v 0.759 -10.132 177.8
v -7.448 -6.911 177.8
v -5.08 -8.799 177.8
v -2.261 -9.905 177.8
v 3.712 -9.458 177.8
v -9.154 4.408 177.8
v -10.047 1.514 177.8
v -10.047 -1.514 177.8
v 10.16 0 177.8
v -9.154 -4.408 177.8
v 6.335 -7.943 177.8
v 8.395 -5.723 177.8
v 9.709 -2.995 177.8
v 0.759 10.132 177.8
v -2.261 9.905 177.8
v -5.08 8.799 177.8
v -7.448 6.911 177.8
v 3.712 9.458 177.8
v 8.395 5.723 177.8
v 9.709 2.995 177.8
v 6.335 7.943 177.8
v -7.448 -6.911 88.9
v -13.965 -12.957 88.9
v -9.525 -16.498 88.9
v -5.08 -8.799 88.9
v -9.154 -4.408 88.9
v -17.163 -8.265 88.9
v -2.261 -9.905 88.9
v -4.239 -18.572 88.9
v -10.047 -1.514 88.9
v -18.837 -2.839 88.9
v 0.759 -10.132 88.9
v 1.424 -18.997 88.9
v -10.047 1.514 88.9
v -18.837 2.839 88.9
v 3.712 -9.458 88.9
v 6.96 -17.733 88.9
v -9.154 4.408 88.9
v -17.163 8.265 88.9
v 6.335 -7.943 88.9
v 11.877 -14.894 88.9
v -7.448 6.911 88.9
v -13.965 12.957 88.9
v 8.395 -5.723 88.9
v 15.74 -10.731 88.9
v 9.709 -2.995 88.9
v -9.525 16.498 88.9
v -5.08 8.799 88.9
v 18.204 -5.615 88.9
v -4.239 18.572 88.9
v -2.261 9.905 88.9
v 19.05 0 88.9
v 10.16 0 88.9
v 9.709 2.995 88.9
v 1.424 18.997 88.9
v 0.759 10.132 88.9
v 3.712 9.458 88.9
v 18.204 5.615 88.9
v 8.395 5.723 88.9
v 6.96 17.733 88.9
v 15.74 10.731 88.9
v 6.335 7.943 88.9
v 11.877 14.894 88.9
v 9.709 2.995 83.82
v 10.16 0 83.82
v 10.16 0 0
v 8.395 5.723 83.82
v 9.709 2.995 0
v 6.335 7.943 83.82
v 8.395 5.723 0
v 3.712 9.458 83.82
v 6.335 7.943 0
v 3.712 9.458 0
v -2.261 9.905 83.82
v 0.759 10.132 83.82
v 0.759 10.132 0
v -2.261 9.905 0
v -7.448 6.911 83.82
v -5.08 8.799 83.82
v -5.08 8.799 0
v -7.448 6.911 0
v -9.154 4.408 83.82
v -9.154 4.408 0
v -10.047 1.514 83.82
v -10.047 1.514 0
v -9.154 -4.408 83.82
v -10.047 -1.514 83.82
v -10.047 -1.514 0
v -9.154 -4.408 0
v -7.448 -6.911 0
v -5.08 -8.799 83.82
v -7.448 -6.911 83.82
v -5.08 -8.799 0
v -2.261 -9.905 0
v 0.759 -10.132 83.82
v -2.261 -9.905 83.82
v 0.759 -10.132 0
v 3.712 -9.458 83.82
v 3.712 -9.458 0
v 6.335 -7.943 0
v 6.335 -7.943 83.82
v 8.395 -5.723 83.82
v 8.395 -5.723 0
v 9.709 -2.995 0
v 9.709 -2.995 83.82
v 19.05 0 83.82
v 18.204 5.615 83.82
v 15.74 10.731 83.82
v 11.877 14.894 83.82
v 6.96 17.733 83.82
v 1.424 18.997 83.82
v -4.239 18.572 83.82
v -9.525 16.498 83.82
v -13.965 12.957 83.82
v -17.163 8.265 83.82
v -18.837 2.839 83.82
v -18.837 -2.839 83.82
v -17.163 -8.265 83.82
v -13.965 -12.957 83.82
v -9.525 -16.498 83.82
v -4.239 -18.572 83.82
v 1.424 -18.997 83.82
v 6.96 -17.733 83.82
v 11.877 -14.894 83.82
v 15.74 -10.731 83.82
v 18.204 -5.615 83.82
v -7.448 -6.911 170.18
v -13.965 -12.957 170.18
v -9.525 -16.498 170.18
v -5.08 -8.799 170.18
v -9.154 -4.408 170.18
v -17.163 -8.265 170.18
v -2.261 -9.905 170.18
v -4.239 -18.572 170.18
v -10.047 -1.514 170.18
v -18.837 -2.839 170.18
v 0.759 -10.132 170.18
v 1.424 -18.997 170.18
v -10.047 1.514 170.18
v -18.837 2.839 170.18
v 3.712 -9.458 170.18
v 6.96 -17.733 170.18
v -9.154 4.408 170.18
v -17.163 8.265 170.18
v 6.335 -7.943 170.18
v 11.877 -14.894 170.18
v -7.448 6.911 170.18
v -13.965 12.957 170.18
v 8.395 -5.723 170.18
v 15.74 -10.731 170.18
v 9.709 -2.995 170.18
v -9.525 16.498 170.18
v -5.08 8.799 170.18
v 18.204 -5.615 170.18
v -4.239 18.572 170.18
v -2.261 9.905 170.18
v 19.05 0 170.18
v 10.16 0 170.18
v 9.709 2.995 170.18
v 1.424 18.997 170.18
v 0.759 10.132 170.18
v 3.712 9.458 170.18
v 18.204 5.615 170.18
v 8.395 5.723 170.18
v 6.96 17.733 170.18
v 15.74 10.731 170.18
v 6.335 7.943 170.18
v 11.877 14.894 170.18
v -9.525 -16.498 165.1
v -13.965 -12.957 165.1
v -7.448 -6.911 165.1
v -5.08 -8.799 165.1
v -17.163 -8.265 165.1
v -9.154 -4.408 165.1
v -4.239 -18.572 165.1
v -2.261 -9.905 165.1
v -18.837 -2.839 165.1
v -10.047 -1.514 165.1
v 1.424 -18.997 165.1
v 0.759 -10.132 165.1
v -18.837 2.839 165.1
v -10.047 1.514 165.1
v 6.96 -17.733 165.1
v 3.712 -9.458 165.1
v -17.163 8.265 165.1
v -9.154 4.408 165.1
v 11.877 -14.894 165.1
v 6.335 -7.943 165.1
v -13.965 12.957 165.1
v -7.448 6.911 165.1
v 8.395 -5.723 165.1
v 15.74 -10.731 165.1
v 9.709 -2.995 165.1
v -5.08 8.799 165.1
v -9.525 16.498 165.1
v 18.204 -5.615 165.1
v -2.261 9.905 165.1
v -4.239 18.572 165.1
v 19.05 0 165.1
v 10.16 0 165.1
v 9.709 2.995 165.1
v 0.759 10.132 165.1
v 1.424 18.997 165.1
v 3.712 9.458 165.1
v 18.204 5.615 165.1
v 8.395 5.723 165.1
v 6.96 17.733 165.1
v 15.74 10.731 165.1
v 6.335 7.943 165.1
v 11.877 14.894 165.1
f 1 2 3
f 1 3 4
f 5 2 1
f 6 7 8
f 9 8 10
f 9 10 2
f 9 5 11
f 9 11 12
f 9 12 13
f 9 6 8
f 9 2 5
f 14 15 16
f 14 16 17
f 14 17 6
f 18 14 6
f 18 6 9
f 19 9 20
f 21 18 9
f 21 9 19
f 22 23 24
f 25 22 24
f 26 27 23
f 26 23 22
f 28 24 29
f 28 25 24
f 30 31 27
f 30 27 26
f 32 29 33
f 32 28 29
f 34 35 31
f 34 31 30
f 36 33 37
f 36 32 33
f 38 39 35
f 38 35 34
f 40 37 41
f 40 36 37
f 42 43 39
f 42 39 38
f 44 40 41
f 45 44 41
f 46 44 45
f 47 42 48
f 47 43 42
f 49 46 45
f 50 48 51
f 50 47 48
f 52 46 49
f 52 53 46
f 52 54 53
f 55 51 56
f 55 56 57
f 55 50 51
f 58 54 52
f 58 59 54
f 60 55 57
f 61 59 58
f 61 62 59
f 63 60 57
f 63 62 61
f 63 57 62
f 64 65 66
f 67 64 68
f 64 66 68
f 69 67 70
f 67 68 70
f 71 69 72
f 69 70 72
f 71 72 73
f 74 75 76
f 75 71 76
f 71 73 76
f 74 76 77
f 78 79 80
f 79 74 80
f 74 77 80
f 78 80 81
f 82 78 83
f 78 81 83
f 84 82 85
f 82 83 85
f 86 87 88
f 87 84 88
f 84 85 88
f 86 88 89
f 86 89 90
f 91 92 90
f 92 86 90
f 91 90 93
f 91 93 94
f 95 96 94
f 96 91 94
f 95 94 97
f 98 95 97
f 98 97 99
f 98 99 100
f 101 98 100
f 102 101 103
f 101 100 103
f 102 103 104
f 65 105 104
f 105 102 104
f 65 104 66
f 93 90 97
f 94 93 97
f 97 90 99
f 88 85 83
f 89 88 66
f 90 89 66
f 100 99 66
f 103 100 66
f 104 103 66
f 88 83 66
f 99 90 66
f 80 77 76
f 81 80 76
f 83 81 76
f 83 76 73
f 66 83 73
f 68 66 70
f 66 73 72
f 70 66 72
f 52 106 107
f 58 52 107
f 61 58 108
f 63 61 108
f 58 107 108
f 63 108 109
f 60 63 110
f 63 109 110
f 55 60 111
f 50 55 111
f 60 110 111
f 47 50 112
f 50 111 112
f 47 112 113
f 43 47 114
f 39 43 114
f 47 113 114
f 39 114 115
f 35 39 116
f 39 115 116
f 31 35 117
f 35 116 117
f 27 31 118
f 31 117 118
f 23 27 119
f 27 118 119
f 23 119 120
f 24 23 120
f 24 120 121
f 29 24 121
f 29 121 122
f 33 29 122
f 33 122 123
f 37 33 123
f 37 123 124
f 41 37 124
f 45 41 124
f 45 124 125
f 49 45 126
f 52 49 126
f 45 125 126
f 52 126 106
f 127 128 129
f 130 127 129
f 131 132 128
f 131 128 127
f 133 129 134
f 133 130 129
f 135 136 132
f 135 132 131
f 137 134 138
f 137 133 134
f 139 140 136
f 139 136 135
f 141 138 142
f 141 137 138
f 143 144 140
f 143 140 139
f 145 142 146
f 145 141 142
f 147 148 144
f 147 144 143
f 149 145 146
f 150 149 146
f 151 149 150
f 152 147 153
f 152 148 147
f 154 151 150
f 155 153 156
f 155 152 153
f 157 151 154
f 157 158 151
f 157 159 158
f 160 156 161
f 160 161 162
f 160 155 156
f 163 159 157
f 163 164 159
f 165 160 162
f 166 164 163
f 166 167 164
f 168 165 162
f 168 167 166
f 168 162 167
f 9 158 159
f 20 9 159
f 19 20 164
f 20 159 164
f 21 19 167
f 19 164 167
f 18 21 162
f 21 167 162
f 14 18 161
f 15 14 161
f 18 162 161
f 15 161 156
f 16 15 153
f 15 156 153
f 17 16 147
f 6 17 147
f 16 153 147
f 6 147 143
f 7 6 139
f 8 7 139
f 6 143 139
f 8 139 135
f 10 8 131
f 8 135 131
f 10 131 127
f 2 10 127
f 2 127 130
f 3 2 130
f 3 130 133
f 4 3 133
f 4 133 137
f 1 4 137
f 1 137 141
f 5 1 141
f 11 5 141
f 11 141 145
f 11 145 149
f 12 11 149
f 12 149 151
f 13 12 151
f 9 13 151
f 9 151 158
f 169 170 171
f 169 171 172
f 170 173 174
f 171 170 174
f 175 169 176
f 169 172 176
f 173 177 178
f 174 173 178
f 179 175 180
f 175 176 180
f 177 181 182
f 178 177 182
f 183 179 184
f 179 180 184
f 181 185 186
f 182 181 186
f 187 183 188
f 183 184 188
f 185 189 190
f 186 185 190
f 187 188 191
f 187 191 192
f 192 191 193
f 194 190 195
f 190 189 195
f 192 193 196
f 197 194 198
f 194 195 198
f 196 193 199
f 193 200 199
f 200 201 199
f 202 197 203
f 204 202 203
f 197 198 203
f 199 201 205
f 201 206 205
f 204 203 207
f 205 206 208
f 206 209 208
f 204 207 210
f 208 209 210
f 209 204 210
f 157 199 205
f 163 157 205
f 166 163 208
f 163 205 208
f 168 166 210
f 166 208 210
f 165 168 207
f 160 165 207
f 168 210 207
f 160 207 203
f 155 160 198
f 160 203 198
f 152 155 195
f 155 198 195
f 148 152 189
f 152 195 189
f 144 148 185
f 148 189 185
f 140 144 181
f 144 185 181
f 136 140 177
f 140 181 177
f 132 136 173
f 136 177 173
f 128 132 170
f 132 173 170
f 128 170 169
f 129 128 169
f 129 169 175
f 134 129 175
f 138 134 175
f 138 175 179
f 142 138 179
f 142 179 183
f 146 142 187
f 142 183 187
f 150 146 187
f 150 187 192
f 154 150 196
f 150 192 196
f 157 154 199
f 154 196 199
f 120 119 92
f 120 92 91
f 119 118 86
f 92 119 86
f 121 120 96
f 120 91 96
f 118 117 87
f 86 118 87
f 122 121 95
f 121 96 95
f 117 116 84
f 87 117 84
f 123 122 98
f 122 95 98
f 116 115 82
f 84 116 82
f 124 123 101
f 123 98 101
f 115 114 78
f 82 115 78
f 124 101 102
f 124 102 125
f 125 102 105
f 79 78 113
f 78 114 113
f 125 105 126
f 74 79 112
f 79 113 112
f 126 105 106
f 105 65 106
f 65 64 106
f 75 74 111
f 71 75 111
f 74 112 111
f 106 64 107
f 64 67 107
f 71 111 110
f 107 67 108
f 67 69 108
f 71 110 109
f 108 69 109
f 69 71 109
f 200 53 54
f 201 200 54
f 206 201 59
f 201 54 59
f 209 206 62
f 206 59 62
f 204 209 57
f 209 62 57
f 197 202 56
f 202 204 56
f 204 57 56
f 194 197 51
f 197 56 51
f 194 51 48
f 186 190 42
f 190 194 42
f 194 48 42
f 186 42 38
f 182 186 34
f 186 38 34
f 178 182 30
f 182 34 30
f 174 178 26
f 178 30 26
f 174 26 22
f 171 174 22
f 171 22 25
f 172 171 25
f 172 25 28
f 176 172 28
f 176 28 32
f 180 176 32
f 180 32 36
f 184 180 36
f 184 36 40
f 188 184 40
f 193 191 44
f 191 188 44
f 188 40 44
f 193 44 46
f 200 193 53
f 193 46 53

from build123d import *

# Parameters (mm, degrees)
SKETCH1_R           = 10.16
BOSS_EXTRUDE1_DEPTH = 177.8
BOSS_EXTRUDE2_START = -12.7
SKETCH2_R           = 19.05
BOSS_EXTRUDE2_DEPTH = 5.08
BOSS_EXTRUDE3_START = -93.98
SKETCH3_R           = 19.05
BOSS_EXTRUDE3_DEPTH = 5.08


with BuildPart() as part:
    # Sketch1 → Boss-Extrude1 (new body)
    with BuildSketch(Plane.XY):
        Circle(SKETCH1_R)
    extrude(amount=BOSS_EXTRUDE1_DEPTH)

    # Sketch2 → Boss-Extrude2 (add)
    with BuildSketch(Plane.XY.offset(177.8).offset(BOSS_EXTRUDE2_START)):
        Circle(SKETCH2_R)
    extrude(amount=BOSS_EXTRUDE2_DEPTH)

    # Sketch3 → Boss-Extrude3 (add)
    with BuildSketch(Plane.XY.offset(177.8).offset(BOSS_EXTRUDE3_START)):
        Circle(SKETCH3_R)
    extrude(amount=BOSS_EXTRUDE3_DEPTH)


solid = part.part
